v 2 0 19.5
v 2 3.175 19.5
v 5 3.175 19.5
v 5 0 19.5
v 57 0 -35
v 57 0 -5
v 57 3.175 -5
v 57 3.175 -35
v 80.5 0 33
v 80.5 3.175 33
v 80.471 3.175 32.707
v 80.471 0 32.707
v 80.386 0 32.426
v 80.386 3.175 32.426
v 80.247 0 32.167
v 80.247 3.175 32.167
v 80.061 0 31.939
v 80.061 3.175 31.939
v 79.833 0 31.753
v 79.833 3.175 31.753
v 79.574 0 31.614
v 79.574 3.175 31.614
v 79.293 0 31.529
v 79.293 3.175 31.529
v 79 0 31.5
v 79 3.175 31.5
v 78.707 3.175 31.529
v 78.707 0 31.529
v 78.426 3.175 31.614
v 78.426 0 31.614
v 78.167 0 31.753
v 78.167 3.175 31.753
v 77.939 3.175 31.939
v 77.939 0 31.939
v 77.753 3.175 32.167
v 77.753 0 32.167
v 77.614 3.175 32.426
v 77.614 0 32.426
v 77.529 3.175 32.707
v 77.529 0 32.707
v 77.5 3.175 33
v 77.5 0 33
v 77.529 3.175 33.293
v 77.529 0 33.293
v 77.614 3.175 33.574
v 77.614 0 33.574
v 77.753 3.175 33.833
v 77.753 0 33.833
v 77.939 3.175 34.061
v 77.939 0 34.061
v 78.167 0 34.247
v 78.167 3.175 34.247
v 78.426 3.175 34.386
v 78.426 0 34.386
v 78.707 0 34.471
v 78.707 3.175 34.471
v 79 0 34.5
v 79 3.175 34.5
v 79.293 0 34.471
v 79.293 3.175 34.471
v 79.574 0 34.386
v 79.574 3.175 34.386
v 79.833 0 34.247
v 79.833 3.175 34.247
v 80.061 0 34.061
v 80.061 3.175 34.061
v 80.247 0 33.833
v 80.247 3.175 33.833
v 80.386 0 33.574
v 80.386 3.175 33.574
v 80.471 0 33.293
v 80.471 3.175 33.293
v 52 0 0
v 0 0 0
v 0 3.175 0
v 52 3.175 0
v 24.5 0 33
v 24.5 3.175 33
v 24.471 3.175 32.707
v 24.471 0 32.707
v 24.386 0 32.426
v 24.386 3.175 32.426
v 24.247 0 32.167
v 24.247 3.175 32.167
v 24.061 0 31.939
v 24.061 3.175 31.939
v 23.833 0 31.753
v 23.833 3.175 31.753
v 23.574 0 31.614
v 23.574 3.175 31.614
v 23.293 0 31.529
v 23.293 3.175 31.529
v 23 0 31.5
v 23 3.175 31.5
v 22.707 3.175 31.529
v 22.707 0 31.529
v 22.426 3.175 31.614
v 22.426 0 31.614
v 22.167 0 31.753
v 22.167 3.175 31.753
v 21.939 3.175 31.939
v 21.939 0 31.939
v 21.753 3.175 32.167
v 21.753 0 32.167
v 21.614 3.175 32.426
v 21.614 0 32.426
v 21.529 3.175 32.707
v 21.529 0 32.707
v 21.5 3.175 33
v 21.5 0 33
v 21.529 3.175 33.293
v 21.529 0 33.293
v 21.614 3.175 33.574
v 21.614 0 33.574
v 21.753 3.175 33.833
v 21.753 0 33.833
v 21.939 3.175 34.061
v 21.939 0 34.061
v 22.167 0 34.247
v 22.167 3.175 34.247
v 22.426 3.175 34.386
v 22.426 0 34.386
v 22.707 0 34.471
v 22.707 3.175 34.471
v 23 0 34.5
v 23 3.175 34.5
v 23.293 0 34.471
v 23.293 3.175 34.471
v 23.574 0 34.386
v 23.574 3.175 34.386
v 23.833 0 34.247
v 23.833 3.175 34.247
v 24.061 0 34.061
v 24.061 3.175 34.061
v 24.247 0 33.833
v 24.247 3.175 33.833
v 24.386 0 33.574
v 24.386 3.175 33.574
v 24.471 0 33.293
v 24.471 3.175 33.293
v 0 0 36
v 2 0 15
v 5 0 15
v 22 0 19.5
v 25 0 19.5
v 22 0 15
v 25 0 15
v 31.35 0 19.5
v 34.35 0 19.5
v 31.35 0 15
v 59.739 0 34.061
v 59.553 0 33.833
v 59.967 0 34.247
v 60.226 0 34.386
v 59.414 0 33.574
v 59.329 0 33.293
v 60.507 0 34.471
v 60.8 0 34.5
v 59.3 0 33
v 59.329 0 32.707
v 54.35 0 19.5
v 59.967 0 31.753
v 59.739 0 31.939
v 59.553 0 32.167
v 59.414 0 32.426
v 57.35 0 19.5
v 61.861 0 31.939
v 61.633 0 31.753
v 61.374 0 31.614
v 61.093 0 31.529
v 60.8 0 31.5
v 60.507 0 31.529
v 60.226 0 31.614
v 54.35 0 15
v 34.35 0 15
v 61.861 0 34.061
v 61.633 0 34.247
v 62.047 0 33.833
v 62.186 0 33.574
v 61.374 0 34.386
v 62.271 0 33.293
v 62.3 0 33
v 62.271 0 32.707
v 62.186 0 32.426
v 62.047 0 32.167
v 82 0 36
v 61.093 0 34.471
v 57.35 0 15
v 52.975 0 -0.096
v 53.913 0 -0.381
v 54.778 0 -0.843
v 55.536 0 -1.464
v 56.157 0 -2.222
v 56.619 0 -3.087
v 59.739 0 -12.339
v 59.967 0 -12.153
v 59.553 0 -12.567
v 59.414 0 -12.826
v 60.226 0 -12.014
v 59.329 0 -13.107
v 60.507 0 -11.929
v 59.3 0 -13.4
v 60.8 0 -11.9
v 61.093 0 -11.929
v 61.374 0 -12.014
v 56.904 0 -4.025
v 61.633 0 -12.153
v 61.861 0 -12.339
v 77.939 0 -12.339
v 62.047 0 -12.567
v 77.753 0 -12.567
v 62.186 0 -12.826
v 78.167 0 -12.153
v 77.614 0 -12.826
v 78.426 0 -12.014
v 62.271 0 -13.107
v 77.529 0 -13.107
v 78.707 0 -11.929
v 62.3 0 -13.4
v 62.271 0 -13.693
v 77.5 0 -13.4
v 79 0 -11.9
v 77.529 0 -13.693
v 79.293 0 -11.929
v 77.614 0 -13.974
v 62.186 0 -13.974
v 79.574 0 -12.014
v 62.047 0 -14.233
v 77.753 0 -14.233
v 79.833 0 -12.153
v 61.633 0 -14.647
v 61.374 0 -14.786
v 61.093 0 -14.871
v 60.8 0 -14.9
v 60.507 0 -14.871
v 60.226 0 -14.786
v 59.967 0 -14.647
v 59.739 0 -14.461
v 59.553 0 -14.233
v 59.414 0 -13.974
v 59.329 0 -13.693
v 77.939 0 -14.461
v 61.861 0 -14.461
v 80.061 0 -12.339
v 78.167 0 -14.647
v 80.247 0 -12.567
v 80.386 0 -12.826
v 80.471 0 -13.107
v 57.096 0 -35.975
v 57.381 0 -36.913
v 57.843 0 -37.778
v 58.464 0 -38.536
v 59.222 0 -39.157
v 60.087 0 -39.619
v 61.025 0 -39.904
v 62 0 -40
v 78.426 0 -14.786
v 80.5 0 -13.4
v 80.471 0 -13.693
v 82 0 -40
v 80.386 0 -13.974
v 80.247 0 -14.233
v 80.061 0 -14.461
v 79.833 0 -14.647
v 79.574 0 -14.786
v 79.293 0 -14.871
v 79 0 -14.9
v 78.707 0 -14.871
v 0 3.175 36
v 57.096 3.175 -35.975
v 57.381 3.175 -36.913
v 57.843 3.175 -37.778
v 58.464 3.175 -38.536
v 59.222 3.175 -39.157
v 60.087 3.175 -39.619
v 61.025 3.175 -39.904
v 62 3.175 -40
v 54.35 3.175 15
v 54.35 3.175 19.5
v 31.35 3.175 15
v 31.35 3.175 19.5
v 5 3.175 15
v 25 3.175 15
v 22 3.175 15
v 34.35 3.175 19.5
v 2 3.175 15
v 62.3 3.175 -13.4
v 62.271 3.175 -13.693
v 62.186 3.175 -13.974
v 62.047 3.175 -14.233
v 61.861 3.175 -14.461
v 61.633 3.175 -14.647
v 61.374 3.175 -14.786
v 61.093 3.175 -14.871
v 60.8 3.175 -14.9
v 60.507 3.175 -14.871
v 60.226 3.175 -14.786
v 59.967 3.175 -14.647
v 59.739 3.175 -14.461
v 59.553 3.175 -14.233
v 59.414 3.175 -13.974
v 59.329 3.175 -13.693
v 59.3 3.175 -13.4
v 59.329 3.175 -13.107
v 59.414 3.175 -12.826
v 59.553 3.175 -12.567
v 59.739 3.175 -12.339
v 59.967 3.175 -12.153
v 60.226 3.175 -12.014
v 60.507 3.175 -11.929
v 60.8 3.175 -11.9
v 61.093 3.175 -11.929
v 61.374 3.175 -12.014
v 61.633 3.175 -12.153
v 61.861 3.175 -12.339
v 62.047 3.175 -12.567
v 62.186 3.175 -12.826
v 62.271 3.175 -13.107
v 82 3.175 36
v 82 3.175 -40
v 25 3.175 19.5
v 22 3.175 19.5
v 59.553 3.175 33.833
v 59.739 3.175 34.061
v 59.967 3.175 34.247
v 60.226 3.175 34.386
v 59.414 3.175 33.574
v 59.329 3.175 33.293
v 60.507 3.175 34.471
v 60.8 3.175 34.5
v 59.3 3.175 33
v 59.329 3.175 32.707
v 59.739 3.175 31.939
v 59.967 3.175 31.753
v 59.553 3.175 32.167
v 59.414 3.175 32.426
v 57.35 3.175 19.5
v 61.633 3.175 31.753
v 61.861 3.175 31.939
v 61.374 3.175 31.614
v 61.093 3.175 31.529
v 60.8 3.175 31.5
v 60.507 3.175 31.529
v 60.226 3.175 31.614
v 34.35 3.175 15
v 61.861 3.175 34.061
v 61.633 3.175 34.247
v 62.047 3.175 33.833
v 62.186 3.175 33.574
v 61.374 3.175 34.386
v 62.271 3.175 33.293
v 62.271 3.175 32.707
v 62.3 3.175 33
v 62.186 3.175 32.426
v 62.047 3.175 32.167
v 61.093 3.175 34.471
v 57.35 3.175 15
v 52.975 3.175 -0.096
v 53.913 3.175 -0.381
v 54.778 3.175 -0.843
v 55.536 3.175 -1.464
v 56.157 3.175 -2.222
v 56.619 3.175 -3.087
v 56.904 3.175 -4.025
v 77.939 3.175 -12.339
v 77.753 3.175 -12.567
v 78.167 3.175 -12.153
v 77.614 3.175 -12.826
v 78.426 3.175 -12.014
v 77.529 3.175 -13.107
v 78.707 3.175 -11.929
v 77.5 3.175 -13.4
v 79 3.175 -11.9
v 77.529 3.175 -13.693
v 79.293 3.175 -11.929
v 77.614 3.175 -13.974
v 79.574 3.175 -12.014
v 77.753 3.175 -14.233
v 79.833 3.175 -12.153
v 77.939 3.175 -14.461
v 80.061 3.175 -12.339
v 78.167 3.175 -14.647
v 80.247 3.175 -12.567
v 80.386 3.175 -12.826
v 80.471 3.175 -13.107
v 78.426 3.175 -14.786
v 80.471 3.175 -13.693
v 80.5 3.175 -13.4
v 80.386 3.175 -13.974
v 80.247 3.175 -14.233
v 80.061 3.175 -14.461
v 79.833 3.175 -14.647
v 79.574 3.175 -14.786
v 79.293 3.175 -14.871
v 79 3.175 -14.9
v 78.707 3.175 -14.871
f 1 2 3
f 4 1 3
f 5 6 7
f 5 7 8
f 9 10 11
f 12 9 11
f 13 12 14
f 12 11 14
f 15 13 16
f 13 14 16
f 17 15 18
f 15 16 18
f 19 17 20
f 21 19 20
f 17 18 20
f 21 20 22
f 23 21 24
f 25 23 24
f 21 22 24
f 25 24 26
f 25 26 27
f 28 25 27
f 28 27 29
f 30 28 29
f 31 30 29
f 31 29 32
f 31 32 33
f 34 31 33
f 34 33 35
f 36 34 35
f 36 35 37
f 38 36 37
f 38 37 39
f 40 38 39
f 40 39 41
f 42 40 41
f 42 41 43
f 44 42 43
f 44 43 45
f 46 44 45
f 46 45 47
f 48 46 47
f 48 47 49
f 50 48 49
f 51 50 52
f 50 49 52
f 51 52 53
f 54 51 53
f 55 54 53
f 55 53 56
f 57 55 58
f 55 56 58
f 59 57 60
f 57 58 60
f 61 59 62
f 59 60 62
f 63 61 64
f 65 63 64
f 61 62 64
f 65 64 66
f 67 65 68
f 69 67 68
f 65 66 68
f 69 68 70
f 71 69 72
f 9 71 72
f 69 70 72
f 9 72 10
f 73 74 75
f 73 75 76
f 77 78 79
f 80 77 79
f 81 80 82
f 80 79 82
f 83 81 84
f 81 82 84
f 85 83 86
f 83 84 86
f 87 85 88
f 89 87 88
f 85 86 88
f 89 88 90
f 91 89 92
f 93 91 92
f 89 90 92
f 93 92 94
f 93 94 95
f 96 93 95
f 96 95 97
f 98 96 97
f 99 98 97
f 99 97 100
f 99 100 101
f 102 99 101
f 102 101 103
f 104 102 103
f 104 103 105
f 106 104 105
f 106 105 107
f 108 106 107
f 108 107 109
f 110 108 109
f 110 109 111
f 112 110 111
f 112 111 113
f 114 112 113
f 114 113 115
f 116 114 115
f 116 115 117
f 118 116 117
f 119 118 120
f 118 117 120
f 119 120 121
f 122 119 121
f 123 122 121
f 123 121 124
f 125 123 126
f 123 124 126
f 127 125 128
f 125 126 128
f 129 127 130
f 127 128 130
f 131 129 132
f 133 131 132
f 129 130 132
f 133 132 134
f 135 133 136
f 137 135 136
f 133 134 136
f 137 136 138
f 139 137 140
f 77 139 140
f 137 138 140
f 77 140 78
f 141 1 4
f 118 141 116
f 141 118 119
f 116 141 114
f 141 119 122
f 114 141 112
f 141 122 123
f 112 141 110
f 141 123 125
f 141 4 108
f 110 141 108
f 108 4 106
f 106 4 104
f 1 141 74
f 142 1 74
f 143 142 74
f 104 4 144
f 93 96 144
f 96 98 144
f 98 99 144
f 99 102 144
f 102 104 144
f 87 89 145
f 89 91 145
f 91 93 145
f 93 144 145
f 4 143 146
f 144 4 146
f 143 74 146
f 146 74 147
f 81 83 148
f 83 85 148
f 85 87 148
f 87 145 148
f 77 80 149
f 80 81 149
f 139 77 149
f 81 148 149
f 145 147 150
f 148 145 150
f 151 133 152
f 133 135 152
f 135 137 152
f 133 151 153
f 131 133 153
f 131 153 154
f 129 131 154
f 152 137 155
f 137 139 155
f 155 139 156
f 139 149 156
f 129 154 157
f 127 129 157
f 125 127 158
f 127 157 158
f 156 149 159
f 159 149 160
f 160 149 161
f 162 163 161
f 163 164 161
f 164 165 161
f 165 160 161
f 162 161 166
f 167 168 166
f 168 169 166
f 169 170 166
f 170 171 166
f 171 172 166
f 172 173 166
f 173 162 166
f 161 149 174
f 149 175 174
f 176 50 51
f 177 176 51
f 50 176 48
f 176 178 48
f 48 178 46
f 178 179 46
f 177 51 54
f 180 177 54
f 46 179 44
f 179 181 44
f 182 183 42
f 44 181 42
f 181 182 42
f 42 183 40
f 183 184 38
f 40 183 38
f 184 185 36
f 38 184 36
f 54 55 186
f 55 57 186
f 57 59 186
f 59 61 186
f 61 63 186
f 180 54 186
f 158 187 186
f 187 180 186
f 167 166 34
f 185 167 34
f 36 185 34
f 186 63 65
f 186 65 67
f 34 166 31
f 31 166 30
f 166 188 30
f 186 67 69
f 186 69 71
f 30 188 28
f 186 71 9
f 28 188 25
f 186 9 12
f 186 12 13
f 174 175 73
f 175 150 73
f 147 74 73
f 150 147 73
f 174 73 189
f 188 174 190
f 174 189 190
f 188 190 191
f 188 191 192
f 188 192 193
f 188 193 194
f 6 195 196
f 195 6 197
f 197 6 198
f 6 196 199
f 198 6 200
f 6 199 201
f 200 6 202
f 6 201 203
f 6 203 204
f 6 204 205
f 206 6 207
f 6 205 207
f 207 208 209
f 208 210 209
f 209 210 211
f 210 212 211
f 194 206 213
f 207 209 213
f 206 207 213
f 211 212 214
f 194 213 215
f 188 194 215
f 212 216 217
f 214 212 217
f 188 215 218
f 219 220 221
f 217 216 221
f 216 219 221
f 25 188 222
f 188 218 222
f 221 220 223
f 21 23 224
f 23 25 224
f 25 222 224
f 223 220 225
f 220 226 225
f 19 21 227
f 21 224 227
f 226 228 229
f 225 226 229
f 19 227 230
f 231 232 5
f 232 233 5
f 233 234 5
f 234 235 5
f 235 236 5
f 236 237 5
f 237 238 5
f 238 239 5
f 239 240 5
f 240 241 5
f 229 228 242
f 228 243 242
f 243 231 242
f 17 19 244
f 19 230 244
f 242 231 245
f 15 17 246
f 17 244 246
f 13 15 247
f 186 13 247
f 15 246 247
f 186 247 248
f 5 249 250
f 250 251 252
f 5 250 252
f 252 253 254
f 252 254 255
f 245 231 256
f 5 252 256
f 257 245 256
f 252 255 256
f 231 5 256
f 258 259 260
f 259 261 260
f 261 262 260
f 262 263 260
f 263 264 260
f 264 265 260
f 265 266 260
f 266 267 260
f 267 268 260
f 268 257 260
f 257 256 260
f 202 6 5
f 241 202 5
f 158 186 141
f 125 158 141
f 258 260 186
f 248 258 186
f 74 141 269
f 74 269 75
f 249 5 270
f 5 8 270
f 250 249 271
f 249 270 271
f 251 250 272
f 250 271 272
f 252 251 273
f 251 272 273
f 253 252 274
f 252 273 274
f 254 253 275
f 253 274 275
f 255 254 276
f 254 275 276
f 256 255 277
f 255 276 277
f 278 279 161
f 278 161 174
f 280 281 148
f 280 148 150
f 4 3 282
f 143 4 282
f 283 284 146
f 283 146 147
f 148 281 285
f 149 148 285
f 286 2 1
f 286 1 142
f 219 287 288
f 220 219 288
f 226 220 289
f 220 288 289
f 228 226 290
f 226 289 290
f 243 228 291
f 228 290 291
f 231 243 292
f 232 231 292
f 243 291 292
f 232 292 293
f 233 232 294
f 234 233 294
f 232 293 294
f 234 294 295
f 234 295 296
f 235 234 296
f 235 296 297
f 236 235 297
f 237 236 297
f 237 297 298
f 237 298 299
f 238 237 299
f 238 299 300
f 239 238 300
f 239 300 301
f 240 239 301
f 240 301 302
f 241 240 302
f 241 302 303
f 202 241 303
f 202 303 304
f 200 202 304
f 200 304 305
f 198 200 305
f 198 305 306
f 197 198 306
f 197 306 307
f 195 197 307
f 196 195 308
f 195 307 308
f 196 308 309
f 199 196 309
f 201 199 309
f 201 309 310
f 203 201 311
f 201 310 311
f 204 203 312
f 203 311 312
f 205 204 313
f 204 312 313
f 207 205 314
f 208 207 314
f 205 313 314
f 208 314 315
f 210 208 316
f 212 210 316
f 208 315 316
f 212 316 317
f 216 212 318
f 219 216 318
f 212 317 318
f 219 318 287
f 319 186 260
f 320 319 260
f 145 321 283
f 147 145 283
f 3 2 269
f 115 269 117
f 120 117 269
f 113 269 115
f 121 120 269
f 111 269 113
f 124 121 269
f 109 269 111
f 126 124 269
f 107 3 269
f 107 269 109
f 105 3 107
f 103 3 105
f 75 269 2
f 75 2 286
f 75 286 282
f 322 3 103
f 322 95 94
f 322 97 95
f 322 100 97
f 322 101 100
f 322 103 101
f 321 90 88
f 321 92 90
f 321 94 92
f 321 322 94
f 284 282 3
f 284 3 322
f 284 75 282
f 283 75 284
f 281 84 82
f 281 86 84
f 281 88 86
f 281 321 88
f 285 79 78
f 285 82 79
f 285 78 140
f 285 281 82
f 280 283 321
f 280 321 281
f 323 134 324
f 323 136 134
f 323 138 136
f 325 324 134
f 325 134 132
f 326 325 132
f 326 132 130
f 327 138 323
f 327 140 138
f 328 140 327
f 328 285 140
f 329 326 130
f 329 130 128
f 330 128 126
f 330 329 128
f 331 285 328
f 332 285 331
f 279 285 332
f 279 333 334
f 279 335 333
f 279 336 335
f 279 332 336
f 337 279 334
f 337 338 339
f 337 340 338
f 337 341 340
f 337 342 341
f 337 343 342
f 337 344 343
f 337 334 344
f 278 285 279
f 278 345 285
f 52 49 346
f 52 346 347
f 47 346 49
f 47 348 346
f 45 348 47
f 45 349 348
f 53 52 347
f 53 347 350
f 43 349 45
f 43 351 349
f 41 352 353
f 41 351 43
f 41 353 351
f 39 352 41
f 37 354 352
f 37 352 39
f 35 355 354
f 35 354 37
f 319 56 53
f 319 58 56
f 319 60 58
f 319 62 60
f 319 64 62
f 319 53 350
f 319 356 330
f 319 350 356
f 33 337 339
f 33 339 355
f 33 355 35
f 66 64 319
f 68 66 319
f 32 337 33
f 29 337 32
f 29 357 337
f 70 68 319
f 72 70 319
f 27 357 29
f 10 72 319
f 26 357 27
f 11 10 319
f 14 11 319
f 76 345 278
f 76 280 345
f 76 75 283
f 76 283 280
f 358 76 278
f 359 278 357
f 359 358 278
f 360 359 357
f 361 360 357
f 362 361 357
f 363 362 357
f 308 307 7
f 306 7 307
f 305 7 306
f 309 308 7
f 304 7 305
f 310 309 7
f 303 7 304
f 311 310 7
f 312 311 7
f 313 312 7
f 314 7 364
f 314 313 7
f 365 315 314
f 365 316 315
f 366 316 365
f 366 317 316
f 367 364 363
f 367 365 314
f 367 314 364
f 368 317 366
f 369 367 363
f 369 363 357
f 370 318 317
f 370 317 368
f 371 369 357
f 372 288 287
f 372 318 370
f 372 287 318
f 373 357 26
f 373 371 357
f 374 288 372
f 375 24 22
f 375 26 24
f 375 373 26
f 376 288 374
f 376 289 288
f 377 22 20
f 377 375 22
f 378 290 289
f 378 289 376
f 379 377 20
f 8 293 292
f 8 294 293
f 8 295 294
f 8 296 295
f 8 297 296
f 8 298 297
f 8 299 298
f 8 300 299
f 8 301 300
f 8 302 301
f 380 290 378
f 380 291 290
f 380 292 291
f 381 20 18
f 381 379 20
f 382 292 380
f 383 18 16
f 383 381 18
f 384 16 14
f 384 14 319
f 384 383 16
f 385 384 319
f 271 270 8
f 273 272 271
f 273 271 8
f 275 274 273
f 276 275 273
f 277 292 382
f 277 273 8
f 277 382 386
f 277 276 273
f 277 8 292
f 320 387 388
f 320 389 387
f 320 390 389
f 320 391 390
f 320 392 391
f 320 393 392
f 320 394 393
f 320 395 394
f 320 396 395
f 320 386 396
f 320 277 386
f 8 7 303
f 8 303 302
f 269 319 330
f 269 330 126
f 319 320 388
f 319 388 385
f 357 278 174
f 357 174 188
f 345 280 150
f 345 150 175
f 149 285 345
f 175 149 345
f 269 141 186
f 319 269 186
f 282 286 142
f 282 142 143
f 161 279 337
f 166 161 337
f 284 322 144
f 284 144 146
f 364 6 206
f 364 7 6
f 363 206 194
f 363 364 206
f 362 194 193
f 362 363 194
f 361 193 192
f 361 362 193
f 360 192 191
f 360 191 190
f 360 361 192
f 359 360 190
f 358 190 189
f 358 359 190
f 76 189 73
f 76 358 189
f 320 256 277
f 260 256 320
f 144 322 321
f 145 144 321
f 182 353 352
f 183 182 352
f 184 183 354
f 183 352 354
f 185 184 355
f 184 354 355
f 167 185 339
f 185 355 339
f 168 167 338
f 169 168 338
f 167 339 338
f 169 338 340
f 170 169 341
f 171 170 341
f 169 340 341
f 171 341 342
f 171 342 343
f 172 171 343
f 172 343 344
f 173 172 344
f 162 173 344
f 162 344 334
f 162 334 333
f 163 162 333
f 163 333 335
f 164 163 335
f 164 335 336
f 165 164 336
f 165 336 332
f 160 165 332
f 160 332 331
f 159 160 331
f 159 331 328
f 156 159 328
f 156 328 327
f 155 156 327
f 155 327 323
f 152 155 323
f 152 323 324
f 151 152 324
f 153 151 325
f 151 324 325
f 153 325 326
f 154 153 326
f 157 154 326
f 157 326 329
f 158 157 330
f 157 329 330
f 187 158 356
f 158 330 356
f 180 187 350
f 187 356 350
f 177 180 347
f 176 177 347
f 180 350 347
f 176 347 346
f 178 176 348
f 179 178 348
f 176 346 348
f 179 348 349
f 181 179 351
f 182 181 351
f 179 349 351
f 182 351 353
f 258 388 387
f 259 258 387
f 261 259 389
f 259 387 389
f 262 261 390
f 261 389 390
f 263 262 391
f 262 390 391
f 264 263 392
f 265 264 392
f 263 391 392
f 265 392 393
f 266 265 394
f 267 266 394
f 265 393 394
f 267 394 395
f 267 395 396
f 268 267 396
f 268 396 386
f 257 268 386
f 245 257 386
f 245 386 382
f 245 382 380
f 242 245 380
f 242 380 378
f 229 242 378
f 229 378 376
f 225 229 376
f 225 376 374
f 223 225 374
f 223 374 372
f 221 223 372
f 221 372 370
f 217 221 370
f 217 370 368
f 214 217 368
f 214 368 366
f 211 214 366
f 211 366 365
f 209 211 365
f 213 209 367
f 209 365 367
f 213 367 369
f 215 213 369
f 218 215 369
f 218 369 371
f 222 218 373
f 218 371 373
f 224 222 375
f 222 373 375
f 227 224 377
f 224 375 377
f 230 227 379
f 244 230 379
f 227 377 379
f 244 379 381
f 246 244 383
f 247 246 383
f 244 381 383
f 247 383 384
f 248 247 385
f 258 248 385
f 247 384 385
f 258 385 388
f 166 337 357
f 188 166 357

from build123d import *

# Parameters (mm, degrees)
SKETCH1_W           = 25
SKETCH1_H           = 40
SKETCH1_W_2         = 82
SKETCH1_H_2         = 36
BOSS_EXTRUDE1_DEPTH = 3.175
CUT_EXTRUDE1_REACH  = 5.175
SKETCH2_R           = 1.5
SKETCH2_W           = 3
SKETCH2_H           = 4.5
FILLET1_R           = 5


with BuildPart() as part:
    # Sketch1 → Boss-Extrude1 (new body)
    with BuildSketch(Plane(origin=(0, 0, 0), x_dir=(1, 0, 0), z_dir=(0, 1, 0))):
        with Locations((69.5, 20)):
            Rectangle(SKETCH1_W, SKETCH1_H)
        with Locations((41, -18)):
            Rectangle(SKETCH1_W_2, SKETCH1_H_2)
    extrude(amount=BOSS_EXTRUDE1_DEPTH)

    # Sketch2 → Cut-Extrude1 (cut, up to next)
    with BuildSketch(Plane(origin=(0, 3.175, 0), x_dir=(1, 0, 0), z_dir=(0, 1, 0)), mode=Mode.PRIVATE) as cut_extrude1_sk1:
        with Locations((79, -33)):
            Circle(SKETCH2_R)
    cut_extrude1_tool1 = extrude(cut_extrude1_sk1.sketch, amount=-CUT_EXTRUDE1_REACH, mode=Mode.PRIVATE) & part.part
    add(cut_extrude1_tool1.solids().sort_by_distance((79, 3.175, 33))[0], mode=Mode.SUBTRACT)
    # Sketch2 → Cut-Extrude1 (cut, up to next)
    with BuildSketch(Plane(origin=(0, 3.175, 0), x_dir=(1, 0, 0), z_dir=(0, 1, 0)), mode=Mode.PRIVATE) as cut_extrude1_sk2:
        with Locations((60.8, -33)):
            Circle(SKETCH2_R)
    cut_extrude1_tool2 = extrude(cut_extrude1_sk2.sketch, amount=-CUT_EXTRUDE1_REACH, mode=Mode.PRIVATE) & part.part
    add(cut_extrude1_tool2.solids().sort_by_distance((60.8, 3.175, 33))[0], mode=Mode.SUBTRACT)
    # Sketch2 → Cut-Extrude1 (cut, up to next)
    with BuildSketch(Plane(origin=(0, 3.175, 0), x_dir=(1, 0, 0), z_dir=(0, 1, 0)), mode=Mode.PRIVATE) as cut_extrude1_sk3:
        with Locations((60.8, 13.4)):
            Circle(SKETCH2_R)
    cut_extrude1_tool3 = extrude(cut_extrude1_sk3.sketch, amount=-CUT_EXTRUDE1_REACH, mode=Mode.PRIVATE) & part.part
    add(cut_extrude1_tool3.solids().sort_by_distance((60.8, 3.175, -13.4))[0], mode=Mode.SUBTRACT)
    # Sketch2 → Cut-Extrude1 (cut, up to next)
    with BuildSketch(Plane(origin=(0, 3.175, 0), x_dir=(1, 0, 0), z_dir=(0, 1, 0)), mode=Mode.PRIVATE) as cut_extrude1_sk4:
        with Locations((79, 13.4)):
            Circle(SKETCH2_R)
    cut_extrude1_tool4 = extrude(cut_extrude1_sk4.sketch, amount=-CUT_EXTRUDE1_REACH, mode=Mode.PRIVATE) & part.part
    add(cut_extrude1_tool4.solids().sort_by_distance((79, 3.175, -13.4))[0], mode=Mode.SUBTRACT)
    # Sketch2 → Cut-Extrude1 (cut, up to next)
    with BuildSketch(Plane(origin=(0, 3.175, 0), x_dir=(1, 0, 0), z_dir=(0, 1, 0)), mode=Mode.PRIVATE) as cut_extrude1_sk5:
        with Locations((23, -33)):
            Circle(SKETCH2_R)
    cut_extrude1_tool5 = extrude(cut_extrude1_sk5.sketch, amount=-CUT_EXTRUDE1_REACH, mode=Mode.PRIVATE) & part.part
    add(cut_extrude1_tool5.solids().sort_by_distance((23, 3.175, 33))[0], mode=Mode.SUBTRACT)
    # Sketch2 → Cut-Extrude1 (cut, up to next)
    with BuildSketch(Plane(origin=(0, 3.175, 0), x_dir=(1, 0, 0), z_dir=(0, 1, 0)), mode=Mode.PRIVATE) as cut_extrude1_sk6:
        with Locations((32.85, -17.25)):
            Rectangle(SKETCH2_W, SKETCH2_H)
    cut_extrude1_tool6 = extrude(cut_extrude1_sk6.sketch, amount=-CUT_EXTRUDE1_REACH, mode=Mode.PRIVATE) & part.part
    add(cut_extrude1_tool6.solids().sort_by_distance((32.85, 3.175, 17.25))[0], mode=Mode.SUBTRACT)
    # Sketch2 → Cut-Extrude1 (cut, up to next)
    with BuildSketch(Plane(origin=(0, 3.175, 0), x_dir=(1, 0, 0), z_dir=(0, 1, 0)), mode=Mode.PRIVATE) as cut_extrude1_sk7:
        with Locations((55.85, -17.25)):
            Rectangle(SKETCH2_W, SKETCH2_H)
    cut_extrude1_tool7 = extrude(cut_extrude1_sk7.sketch, amount=-CUT_EXTRUDE1_REACH, mode=Mode.PRIVATE) & part.part
    add(cut_extrude1_tool7.solids().sort_by_distance((55.85, 3.175, 17.25))[0], mode=Mode.SUBTRACT)
    # Sketch2 → Cut-Extrude1 (cut, up to next)
    with BuildSketch(Plane(origin=(0, 3.175, 0), x_dir=(1, 0, 0), z_dir=(0, 1, 0)), mode=Mode.PRIVATE) as cut_extrude1_sk8:
        with Locations((3.5, -17.25)):
            Rectangle(SKETCH2_W, SKETCH2_H)
    cut_extrude1_tool8 = extrude(cut_extrude1_sk8.sketch, amount=-CUT_EXTRUDE1_REACH, mode=Mode.PRIVATE) & part.part
    add(cut_extrude1_tool8.solids().sort_by_distance((3.5, 3.175, 17.25))[0], mode=Mode.SUBTRACT)
    # Sketch2 → Cut-Extrude1 (cut, up to next)
    with BuildSketch(Plane(origin=(0, 3.175, 0), x_dir=(1, 0, 0), z_dir=(0, 1, 0)), mode=Mode.PRIVATE) as cut_extrude1_sk9:
        with Locations((23.5, -17.25)):
            Rectangle(SKETCH2_W, SKETCH2_H)
    cut_extrude1_tool9 = extrude(cut_extrude1_sk9.sketch, amount=-CUT_EXTRUDE1_REACH, mode=Mode.PRIVATE) & part.part
    add(cut_extrude1_tool9.solids().sort_by_distance((23.5, 3.175, 17.25))[0], mode=Mode.SUBTRACT)

    # Fillet1
    fillet1_edges = [part.edges().sort_by_distance(p)[0] for p in [
        (57, 1.5875, -40),
        (57, 1.5875, 0),
    ]]
    fillet(fillet1_edges, radius=FILLET1_R)


solid = part.part
